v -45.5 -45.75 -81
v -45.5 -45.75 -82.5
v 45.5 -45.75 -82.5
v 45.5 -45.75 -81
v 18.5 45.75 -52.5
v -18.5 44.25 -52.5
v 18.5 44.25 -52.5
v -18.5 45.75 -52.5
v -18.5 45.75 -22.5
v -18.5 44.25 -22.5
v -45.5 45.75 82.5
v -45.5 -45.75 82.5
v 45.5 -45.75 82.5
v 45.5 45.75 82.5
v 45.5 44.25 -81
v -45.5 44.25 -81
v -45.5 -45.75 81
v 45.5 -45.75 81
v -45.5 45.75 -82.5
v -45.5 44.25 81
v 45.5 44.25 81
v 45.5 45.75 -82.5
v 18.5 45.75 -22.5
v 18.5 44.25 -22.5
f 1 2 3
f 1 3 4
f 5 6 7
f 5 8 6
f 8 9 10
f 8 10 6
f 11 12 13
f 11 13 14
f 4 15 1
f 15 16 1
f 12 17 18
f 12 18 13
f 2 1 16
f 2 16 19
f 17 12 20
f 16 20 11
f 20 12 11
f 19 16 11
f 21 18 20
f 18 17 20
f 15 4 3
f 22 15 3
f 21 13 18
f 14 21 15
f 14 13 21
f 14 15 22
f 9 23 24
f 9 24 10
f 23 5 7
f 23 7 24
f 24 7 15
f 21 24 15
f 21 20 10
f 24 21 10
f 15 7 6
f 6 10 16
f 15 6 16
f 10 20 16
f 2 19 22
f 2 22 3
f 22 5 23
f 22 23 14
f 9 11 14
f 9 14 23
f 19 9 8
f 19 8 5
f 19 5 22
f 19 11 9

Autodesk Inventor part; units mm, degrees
ref_plane "YZ Plane" through (0, 0, 0) normal (1, 0, 0) x (0, 1, 0)
ref_plane "XZ Plane" through (0, 0, 0) normal (0, 1, 0) x (-1, 0, 0)
ref_plane "XY Plane" through (0, 0, 0) normal (0, 0, 1) x (1, 0, 0)
sketch "Skizze1" plane through (0, 0, 0) normal (1, 0, 0) x (0, 1, 0)
  line L0 (-45.75, 82.5) -> (45.75, 82.5)
  line L1 (45.75, 82.5) -> (45.75, -82.5)
  line L2 (45.75, -82.5) -> (-45.75, -82.5)
  line L3 (-45.75, 81) -> (44.25, 81)
  line L4 (44.25, 81) -> (44.25, -81)
  line L5 (44.25, -81) -> (-45.75, -81)
  line L6 (-45.75, -82.5) -> (-45.75, -81)
  line L7 (-45.75, 81) -> (-45.75, 82.5)
  point P0 (0, 0)
  point P1 (0, 82.5)
  point P2 (45.75, 0)
  dimension "d0" = 1.5
  dimension "d1" = 1.5
  dimension "d2" = 1.5
  dimension "d3" = 90
  dimension "d4" = 165
extrude "Extrusion1" add sketch "Skizze1" along normal mid plane 91
sketch "Skizze2" plane through (-45.5, 45.75, 82.5) normal (0, 1, 0) x (1, 0, 0)
  line L0 (64, 105) -> (27, 105)
  line L1 (27, 105) -> (27, 135)
  line L2 (27, 135) -> (64, 135)
  line L3 (64, 135) -> (64, 105)
  line L4 (91, 165) -> (0, 165) projected
  line L5 (91, 165) -> (91, 0) projected
  line L6 (0, 0) -> (0, 165) projected
  point P0 (45.5, 82.5)
  dimension "d7" = 30
  dimension "d8" = 30
  dimension "d9" = 27
  dimension "d10" = 27
extrude "Extrusion2" cut sketch "Skizze2" against normal through all
properties part number "Platinenhalter"
